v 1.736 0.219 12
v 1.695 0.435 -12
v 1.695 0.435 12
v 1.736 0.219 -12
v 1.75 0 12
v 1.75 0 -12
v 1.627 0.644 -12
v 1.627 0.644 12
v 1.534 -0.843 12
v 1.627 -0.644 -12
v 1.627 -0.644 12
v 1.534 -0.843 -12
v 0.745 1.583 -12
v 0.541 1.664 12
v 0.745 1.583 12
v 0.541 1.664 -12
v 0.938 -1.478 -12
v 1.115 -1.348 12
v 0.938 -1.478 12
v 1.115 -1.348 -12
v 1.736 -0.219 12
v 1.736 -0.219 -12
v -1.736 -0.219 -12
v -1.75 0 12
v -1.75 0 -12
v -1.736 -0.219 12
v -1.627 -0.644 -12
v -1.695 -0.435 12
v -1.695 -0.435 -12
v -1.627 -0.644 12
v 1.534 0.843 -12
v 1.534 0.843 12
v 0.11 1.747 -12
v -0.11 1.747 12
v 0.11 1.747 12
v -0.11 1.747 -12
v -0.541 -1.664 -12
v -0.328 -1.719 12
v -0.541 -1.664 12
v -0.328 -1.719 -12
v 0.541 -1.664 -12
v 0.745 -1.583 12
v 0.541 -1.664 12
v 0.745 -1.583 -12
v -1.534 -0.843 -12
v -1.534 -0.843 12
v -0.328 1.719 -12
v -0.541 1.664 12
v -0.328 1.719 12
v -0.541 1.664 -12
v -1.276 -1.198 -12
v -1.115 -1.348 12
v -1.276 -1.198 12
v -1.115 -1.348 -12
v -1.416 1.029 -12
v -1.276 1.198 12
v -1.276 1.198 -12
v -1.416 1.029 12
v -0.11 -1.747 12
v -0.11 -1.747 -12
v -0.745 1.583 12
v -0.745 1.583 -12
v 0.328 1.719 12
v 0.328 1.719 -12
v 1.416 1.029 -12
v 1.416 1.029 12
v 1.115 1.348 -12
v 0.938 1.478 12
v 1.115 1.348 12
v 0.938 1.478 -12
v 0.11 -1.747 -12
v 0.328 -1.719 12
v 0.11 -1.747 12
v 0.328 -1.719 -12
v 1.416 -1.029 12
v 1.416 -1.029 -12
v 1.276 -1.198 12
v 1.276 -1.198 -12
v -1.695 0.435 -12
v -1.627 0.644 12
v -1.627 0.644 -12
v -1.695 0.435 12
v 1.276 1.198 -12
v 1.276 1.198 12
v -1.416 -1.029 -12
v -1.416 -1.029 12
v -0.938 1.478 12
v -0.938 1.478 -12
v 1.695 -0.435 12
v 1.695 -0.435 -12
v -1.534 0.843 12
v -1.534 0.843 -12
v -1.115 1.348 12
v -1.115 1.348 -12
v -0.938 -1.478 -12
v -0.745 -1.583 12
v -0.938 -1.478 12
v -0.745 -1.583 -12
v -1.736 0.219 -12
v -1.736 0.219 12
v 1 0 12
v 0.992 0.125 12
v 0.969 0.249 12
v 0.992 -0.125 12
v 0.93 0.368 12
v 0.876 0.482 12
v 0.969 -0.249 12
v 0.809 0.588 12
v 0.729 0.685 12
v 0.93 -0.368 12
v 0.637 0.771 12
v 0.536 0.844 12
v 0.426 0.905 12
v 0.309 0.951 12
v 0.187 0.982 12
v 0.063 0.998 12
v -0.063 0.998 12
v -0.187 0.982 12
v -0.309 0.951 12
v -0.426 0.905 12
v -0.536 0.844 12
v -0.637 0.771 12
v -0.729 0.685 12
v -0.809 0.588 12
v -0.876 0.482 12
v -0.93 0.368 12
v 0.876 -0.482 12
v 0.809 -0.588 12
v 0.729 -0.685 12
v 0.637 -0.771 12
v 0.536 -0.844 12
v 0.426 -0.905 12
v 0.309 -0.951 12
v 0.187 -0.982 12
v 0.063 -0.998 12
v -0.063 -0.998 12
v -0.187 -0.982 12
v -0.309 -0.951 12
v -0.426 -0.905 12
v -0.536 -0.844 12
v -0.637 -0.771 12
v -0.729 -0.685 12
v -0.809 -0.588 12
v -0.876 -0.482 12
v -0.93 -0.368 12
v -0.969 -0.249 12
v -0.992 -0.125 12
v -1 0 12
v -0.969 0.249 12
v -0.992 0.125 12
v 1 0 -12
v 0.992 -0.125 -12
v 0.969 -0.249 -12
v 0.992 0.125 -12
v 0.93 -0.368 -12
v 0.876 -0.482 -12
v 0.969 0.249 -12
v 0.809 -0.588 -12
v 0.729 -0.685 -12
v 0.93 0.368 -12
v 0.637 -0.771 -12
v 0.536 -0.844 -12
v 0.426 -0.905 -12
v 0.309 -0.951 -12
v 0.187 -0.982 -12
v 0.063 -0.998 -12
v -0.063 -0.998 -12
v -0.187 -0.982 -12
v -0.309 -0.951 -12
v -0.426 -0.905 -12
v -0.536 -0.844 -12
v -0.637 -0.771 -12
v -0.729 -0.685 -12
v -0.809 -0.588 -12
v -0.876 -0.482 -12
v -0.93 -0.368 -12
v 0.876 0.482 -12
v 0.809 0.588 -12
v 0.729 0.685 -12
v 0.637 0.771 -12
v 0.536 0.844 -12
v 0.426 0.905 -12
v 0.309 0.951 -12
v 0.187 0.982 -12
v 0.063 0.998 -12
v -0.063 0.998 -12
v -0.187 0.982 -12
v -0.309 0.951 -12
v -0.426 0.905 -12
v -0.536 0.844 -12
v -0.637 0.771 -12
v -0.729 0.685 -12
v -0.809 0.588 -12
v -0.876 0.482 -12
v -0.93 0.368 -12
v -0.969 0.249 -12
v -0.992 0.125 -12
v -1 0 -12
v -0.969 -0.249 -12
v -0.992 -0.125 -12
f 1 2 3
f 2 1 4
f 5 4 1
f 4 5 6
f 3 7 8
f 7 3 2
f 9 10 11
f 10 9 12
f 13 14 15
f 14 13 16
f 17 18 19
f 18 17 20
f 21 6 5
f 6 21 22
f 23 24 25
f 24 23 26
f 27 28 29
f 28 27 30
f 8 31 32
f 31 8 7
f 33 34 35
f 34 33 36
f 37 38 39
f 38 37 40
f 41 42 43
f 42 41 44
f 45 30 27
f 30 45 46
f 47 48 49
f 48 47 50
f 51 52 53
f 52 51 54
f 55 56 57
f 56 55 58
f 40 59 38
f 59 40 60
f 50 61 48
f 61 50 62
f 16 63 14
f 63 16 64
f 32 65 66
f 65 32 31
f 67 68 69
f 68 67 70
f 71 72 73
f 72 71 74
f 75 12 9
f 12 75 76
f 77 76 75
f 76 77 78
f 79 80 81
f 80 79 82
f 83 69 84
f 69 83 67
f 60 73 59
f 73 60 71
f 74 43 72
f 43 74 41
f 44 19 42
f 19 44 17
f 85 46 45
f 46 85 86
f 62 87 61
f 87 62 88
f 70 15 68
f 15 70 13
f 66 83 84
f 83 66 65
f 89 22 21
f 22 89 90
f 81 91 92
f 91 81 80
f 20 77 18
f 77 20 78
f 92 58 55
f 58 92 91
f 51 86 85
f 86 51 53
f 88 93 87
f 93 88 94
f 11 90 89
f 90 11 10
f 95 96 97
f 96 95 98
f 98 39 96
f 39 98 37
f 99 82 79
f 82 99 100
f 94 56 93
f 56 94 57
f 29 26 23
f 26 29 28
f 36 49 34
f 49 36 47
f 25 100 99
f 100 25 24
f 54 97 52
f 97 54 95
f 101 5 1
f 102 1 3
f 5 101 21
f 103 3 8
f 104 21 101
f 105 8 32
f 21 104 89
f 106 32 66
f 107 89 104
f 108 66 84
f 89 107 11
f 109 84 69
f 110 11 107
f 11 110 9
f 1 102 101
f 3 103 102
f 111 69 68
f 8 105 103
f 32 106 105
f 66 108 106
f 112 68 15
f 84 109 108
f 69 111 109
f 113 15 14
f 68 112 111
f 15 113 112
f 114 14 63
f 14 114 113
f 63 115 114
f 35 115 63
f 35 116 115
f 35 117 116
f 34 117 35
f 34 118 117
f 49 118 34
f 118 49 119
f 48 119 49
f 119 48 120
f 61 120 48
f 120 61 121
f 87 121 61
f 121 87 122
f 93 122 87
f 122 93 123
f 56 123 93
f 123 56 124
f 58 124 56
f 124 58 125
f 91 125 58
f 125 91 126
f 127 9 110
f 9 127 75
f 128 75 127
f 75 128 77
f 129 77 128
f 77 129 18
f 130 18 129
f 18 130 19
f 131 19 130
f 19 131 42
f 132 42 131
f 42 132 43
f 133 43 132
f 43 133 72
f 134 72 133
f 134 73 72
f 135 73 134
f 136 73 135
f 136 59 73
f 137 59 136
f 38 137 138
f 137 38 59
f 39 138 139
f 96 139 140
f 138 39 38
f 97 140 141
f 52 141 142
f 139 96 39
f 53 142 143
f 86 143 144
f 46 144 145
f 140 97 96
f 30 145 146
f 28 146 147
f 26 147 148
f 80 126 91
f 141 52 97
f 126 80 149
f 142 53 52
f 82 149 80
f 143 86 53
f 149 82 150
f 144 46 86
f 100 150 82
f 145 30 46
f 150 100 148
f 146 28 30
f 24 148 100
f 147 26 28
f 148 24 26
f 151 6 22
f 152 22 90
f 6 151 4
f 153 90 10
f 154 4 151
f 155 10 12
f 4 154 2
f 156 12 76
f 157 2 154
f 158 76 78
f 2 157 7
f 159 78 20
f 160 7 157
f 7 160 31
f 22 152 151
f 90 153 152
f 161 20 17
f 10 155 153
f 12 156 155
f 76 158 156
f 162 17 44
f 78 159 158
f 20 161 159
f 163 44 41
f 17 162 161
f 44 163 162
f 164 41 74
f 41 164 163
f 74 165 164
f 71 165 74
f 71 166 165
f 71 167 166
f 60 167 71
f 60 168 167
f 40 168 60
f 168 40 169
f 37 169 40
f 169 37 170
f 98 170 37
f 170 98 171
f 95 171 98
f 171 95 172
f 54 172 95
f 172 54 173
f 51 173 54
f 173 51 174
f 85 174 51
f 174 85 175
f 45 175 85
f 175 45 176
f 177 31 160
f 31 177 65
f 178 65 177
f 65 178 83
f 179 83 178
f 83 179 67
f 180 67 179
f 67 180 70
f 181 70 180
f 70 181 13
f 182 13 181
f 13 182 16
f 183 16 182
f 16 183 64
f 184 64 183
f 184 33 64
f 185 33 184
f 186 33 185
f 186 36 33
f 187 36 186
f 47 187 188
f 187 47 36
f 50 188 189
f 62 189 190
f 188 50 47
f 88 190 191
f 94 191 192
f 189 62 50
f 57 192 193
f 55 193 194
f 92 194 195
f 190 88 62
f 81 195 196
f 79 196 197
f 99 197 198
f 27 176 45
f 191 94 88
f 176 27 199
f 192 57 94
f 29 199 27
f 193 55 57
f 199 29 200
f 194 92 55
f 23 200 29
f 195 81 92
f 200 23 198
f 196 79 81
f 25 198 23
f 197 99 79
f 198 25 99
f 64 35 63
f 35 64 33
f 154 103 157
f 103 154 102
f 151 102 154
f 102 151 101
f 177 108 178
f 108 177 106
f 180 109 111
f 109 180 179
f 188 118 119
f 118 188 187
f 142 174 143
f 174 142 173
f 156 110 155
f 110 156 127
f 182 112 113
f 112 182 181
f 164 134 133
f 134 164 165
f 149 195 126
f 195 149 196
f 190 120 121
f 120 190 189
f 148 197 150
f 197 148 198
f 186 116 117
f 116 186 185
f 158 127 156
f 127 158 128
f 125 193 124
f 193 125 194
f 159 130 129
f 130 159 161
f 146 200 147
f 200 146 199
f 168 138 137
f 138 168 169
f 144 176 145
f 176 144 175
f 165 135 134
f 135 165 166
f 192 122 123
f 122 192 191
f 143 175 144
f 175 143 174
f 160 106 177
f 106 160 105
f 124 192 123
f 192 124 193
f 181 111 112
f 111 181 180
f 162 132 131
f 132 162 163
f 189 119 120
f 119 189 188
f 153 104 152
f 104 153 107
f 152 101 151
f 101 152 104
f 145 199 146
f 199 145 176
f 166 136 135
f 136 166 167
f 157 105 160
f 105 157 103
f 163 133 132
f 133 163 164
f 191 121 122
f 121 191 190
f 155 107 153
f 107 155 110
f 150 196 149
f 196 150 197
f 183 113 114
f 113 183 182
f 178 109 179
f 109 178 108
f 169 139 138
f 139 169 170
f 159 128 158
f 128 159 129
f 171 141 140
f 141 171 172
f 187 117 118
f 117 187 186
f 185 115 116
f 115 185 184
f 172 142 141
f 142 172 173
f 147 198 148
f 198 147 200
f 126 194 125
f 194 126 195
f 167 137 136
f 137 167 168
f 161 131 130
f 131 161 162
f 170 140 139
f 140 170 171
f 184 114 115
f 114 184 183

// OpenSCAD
$fn = 50;


difference() {
	union() {
		translate(v = [0, 0, -12.0000000000]) {
			cylinder(h = 24, r = 1.7500000000);
		}
	}
	union() {
		translate(v = [0, 0, -100.0000000000]) {
			cylinder(h = 200, r = 1.0000000000);
		}
	}
}
